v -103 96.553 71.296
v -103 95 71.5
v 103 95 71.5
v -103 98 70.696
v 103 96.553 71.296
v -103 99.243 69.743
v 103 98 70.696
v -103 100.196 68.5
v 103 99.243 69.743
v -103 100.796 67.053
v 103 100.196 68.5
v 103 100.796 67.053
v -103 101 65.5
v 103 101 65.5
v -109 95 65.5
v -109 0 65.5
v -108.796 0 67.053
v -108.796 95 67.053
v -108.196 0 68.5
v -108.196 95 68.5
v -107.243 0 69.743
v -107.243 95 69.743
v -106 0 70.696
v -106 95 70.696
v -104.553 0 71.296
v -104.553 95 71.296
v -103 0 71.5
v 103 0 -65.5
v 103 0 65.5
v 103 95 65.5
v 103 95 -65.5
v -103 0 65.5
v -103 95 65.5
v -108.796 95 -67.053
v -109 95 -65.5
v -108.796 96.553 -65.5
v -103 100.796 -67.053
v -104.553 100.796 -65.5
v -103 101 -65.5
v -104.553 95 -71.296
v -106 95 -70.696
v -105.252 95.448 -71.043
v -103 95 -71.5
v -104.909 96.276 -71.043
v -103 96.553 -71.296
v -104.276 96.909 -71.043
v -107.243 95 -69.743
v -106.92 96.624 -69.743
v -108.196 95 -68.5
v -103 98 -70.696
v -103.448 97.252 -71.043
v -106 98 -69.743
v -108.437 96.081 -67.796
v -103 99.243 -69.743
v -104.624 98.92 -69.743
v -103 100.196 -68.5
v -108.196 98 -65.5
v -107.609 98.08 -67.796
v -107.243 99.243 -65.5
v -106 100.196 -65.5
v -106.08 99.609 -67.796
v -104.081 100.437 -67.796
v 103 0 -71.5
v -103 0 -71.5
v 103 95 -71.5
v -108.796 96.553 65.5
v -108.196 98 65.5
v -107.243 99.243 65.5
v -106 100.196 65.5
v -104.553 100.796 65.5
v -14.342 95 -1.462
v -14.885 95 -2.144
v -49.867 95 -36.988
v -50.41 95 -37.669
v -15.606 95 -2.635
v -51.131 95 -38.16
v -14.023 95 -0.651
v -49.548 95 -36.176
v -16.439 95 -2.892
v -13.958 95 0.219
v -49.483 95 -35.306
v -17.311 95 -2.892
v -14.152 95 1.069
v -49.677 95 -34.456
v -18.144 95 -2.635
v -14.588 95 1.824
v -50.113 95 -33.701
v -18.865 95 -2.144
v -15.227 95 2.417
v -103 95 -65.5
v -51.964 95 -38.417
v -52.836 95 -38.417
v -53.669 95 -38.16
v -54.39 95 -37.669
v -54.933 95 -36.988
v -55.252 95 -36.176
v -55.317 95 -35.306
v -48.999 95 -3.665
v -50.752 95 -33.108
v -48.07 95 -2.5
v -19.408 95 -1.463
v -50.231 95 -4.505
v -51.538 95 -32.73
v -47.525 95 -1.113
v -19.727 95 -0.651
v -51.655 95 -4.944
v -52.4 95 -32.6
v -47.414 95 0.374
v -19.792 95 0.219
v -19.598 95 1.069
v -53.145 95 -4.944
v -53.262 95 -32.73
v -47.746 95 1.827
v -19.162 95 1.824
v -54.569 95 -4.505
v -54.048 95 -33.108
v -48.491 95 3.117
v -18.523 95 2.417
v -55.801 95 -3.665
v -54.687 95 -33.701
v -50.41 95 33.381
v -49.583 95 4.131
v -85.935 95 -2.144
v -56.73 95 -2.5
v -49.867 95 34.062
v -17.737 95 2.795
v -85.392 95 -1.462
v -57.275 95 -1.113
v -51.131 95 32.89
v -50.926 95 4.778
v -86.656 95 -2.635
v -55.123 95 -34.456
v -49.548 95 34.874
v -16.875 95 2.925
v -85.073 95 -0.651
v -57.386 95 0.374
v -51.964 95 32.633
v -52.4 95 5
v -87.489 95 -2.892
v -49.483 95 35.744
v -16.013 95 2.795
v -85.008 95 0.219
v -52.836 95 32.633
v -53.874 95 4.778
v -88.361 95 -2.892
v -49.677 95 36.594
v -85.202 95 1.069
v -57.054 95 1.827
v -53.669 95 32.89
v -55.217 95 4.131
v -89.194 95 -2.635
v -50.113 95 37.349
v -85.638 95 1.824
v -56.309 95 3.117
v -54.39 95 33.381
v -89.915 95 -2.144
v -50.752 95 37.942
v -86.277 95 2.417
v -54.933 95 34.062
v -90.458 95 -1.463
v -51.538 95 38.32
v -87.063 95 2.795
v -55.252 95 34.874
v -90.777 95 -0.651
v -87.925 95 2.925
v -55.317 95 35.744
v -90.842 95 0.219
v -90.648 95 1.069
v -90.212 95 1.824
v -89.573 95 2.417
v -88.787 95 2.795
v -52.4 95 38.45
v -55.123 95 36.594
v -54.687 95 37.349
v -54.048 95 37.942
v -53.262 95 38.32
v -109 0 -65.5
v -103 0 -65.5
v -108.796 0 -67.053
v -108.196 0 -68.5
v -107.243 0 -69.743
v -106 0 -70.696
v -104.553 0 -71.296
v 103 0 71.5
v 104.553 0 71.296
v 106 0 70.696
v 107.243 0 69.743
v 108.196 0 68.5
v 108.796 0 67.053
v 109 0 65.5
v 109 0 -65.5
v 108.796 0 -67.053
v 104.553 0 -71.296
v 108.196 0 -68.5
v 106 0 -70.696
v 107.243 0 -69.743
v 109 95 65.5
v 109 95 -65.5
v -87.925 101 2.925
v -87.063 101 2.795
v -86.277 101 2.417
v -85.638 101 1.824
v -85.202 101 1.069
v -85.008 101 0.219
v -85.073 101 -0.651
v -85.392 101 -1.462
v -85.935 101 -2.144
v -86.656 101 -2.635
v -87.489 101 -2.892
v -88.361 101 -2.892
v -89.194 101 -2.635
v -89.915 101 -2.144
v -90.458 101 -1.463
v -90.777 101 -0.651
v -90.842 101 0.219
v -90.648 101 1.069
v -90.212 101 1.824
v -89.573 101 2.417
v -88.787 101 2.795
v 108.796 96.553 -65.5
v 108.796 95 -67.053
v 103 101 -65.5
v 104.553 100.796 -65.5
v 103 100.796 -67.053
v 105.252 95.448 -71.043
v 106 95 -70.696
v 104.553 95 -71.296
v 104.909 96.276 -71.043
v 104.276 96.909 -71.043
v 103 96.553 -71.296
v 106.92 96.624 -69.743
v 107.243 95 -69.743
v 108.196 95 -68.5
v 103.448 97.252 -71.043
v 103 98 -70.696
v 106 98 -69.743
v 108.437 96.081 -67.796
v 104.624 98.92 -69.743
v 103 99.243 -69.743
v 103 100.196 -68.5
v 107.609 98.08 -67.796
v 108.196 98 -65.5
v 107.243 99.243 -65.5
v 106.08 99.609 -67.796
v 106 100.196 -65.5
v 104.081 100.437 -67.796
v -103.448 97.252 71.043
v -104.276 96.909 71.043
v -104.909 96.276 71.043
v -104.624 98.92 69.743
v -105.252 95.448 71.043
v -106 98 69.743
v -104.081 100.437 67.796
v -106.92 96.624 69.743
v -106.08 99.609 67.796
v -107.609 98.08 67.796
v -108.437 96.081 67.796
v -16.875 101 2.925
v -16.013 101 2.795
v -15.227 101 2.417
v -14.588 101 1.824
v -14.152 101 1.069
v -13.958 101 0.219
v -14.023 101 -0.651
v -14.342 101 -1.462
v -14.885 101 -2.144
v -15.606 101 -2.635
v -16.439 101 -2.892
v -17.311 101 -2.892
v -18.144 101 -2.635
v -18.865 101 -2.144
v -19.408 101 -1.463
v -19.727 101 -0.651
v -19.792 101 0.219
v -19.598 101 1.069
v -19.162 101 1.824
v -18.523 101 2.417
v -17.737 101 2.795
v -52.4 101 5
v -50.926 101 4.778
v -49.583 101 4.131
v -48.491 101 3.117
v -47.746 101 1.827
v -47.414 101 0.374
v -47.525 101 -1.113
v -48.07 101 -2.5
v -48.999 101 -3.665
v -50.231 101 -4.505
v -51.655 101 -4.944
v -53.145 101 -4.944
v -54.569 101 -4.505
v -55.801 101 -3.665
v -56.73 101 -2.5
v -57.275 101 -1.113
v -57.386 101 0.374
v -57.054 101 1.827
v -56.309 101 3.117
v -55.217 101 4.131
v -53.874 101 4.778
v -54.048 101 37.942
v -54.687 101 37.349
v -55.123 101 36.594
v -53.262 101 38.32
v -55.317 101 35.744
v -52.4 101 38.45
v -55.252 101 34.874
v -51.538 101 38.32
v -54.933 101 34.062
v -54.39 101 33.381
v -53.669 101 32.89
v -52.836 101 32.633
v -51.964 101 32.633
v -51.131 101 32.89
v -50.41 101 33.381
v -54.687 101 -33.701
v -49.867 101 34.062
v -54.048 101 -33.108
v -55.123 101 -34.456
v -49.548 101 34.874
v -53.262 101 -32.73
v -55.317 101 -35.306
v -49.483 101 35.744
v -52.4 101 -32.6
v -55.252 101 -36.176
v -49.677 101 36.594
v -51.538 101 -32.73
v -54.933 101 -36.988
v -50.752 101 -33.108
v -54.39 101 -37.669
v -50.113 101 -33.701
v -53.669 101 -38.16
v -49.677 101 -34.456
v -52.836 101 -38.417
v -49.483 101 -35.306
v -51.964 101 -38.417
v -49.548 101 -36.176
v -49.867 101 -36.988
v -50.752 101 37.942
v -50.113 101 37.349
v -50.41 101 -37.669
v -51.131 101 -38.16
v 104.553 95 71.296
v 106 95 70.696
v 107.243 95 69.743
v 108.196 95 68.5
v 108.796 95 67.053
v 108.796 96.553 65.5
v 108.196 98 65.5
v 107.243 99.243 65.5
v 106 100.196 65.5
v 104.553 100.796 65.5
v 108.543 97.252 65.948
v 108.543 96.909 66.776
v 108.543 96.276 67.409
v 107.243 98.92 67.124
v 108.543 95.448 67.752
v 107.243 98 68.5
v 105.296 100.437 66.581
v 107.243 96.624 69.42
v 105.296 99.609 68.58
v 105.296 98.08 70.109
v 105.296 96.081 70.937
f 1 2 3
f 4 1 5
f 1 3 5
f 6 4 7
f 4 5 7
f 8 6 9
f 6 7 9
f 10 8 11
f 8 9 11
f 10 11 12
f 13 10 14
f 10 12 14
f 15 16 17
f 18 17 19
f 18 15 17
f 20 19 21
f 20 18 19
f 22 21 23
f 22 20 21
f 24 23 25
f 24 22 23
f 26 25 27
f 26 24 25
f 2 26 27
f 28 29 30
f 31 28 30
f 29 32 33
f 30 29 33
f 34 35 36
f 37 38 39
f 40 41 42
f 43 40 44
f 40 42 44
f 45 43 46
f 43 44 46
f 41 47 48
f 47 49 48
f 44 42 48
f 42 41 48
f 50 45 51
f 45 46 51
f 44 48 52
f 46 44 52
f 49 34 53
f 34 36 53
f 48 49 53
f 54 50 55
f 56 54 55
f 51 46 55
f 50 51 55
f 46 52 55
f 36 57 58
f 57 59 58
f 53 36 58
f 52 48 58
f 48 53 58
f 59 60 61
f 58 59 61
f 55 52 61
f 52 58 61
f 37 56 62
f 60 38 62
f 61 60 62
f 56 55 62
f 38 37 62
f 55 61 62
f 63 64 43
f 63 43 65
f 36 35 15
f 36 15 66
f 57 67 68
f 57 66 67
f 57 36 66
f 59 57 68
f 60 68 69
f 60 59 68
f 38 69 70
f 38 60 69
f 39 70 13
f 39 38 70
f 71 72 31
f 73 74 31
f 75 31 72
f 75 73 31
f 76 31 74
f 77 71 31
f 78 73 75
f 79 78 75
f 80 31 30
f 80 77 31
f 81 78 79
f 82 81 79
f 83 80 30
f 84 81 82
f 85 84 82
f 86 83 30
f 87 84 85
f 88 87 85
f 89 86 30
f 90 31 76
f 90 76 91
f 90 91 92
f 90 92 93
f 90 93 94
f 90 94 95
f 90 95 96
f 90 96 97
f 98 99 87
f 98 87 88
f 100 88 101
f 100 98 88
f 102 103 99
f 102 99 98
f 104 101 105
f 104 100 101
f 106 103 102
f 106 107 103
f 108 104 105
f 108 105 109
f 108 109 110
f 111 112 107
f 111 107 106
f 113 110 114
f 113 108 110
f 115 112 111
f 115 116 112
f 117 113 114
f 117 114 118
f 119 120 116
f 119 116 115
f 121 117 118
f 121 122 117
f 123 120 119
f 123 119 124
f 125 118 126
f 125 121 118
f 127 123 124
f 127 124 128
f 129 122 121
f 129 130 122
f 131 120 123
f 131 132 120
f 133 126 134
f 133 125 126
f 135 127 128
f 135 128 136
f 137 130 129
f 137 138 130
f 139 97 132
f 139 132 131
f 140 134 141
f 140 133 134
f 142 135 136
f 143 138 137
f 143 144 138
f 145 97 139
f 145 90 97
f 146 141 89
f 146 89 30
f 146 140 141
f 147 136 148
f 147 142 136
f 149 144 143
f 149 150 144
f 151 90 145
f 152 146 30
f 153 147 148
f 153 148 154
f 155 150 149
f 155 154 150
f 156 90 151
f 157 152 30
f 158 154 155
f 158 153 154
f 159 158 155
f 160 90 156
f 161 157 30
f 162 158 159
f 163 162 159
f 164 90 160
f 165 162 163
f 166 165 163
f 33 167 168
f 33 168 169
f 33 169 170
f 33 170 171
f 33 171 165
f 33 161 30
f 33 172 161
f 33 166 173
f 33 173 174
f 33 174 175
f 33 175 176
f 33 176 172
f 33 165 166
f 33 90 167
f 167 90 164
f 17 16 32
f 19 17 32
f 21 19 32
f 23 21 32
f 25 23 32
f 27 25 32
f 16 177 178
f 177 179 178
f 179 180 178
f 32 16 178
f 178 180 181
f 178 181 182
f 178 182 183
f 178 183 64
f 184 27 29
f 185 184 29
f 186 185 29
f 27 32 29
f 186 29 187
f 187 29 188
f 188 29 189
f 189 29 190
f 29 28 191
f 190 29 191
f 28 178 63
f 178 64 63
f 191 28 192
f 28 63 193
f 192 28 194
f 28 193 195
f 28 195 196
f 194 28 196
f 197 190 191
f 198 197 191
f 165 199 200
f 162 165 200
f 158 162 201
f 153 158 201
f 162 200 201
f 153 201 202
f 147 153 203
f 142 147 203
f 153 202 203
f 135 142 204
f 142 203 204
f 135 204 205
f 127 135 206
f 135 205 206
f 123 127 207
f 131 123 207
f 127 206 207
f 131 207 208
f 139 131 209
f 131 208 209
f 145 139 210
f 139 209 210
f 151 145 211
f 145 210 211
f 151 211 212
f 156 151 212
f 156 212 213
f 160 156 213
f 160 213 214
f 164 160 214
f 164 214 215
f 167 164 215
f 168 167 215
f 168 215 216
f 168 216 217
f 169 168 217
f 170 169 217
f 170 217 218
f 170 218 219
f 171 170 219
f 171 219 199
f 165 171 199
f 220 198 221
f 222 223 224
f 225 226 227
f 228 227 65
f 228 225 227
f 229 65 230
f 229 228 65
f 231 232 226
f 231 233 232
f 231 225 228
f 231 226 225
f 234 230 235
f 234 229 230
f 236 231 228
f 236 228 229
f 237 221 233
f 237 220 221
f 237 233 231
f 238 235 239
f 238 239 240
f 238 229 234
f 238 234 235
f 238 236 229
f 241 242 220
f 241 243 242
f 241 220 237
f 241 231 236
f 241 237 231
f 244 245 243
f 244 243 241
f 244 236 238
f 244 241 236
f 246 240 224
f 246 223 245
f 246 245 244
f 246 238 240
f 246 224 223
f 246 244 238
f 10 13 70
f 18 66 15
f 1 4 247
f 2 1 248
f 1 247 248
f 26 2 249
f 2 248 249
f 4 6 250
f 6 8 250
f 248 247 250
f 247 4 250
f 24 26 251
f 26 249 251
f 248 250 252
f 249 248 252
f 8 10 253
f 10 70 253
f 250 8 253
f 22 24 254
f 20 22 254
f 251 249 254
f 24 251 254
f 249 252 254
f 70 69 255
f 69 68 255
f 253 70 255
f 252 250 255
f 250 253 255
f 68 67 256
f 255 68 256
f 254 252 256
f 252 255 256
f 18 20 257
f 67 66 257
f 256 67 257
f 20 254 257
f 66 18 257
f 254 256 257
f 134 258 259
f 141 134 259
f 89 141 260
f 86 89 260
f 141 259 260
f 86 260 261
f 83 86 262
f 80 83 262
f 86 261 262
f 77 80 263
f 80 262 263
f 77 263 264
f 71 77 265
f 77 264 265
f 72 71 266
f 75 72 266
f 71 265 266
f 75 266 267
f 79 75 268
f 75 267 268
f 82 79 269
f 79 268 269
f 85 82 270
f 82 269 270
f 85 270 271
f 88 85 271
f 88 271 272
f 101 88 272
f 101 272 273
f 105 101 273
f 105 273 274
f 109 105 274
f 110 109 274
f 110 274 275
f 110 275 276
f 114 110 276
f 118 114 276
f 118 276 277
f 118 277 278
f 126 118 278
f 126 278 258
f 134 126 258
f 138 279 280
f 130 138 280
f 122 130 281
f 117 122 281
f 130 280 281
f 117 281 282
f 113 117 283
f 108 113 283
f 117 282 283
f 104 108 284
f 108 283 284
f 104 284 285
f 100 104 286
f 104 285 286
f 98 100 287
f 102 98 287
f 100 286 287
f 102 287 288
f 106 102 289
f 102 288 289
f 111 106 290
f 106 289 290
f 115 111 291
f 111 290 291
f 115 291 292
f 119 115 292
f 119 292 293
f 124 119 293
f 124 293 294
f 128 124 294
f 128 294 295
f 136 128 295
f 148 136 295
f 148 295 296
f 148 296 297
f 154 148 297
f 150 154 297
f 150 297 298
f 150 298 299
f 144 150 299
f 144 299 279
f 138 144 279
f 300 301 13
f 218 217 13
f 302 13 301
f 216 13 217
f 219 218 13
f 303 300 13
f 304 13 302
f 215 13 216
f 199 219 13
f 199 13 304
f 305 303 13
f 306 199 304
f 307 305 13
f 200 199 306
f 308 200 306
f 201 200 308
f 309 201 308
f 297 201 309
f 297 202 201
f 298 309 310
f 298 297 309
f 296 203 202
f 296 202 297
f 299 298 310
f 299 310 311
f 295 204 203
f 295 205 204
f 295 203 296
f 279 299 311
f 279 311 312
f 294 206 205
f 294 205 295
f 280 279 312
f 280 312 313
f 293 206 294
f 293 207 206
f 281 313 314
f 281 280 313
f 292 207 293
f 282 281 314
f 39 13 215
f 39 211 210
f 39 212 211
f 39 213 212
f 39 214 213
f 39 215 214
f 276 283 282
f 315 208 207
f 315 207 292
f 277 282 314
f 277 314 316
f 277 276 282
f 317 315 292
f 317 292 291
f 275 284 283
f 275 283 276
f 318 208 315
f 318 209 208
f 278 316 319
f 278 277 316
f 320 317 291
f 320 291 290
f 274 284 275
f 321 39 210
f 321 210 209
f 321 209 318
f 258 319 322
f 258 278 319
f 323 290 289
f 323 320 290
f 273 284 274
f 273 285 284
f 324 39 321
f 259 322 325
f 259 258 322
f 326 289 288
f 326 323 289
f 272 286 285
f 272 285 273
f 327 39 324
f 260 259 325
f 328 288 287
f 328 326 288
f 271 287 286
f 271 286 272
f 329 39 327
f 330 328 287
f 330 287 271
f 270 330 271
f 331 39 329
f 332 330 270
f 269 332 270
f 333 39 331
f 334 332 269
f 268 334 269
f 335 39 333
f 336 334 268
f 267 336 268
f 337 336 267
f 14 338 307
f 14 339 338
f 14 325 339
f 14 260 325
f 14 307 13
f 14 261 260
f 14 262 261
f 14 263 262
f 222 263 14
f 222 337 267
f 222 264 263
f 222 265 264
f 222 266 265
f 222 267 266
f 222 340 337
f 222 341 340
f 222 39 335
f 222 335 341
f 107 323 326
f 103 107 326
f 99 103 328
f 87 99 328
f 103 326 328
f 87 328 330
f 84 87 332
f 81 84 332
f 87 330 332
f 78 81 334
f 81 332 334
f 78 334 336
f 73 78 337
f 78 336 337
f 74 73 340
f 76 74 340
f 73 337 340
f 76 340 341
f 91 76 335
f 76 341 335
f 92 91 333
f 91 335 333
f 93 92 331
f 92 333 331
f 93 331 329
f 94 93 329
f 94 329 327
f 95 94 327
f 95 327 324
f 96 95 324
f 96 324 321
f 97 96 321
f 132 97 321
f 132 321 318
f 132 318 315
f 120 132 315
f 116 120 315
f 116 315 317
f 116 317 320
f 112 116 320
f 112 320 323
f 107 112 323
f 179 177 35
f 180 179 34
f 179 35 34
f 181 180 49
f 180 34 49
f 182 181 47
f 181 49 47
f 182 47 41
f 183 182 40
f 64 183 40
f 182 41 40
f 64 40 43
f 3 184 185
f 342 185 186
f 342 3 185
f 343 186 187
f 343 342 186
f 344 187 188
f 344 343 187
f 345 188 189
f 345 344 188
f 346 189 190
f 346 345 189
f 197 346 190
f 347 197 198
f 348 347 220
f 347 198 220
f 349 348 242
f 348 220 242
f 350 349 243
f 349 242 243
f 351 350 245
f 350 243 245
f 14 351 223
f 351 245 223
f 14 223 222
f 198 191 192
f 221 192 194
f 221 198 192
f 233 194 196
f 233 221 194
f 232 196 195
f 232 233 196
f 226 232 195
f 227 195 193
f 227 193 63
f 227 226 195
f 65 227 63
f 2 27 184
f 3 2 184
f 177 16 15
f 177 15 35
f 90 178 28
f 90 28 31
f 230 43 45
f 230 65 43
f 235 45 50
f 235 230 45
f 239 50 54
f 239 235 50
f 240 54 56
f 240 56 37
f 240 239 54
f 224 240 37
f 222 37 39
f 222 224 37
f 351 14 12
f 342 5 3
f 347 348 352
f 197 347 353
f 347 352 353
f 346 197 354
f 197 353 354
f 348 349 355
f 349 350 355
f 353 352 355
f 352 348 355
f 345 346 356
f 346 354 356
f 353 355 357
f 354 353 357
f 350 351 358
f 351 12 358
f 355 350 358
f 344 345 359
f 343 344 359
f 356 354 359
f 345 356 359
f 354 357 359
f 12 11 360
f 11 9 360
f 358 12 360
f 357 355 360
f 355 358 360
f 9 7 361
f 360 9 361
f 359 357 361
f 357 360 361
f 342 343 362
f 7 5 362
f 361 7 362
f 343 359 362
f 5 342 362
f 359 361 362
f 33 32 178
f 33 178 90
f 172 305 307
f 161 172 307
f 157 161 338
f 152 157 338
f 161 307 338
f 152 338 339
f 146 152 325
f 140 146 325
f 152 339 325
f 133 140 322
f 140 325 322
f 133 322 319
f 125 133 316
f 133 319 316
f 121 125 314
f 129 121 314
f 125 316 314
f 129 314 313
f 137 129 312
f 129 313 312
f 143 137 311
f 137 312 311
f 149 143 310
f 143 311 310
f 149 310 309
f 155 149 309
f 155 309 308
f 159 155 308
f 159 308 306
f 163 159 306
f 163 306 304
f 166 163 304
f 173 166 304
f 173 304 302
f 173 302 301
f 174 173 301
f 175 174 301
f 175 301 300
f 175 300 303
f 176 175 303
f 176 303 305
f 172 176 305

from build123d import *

# Parameters (mm, degrees)
SKETCH1_W           = 218
SKETCH1_H           = 143
BOSS_EXTRUDE1_DEPTH = 101
FILLET1_R           = 6
SHELL1_START        = -103
SHELL1_OUTLINE_W    = 95
SHELL1_OUTLINE_H    = 131
SHELL1_DEPTH        = 206
SKETCH2_R           = 5
SKETCH2_R_2         = 2.925
CUT_EXTRUDE1_DEPTH  = 165.906791855


# Read off the part's stored shape, not the designer's step: Shell1
with BuildPart() as part:
    # Sketch1 → Boss-Extrude1 (new body)
    with BuildSketch(Plane(origin=(0, 0, 0), x_dir=(1, 0, 0), z_dir=(0, 1, 0))):
        Rectangle(SKETCH1_W, SKETCH1_H)
    extrude(amount=BOSS_EXTRUDE1_DEPTH)

    # Fillet1
    fillet1_edges = [part.edges().sort_by_distance(p)[0] for p in [
        (-109, 101, 0),
        (0, 101, 71.5),
        (109, 101, 0),
        (109, 50.5, 71.5),
        (-109, 50.5, 71.5),
        (-109, 50.5, -71.5),
        (109, 50.5, -71.5),
        (0, 101, -71.5),
    ]]
    fillet(fillet1_edges, radius=FILLET1_R)

    # Shell1 outline → Shell1 (cut)
    with BuildSketch(Plane.YZ.offset(SHELL1_START)):
        with Locations((47.5, 0)):
            Rectangle(SHELL1_OUTLINE_W, SHELL1_OUTLINE_H)
    extrude(amount=SHELL1_DEPTH, mode=Mode.SUBTRACT)

    # Sketch2 → Cut-Extrude1 (cut, through all)
    with BuildSketch(Plane(origin=(0, 101, 0), x_dir=(1, 0, 0), z_dir=(0, 1, 0))):
        with Locations(Location((-52.4, 0, 0), (0, 0, 270))):
            Circle(SKETCH2_R)
        with Locations(Location((-52.4, 35.525, 0), (0, 0, 270))):
            Circle(SKETCH2_R_2)
        with Locations(Location((-87.925, 0, 0), (0, 0, 270))):
            Circle(SKETCH2_R_2)
        with Locations(Location((-52.4, -35.525, 0), (0, 0, 270))):
            Circle(SKETCH2_R_2)
        with Locations(Location((-16.875, 0, 0), (0, 0, 270))):
            Circle(SKETCH2_R_2)
    extrude(amount=-CUT_EXTRUDE1_DEPTH, mode=Mode.SUBTRACT)


solid = part.part
